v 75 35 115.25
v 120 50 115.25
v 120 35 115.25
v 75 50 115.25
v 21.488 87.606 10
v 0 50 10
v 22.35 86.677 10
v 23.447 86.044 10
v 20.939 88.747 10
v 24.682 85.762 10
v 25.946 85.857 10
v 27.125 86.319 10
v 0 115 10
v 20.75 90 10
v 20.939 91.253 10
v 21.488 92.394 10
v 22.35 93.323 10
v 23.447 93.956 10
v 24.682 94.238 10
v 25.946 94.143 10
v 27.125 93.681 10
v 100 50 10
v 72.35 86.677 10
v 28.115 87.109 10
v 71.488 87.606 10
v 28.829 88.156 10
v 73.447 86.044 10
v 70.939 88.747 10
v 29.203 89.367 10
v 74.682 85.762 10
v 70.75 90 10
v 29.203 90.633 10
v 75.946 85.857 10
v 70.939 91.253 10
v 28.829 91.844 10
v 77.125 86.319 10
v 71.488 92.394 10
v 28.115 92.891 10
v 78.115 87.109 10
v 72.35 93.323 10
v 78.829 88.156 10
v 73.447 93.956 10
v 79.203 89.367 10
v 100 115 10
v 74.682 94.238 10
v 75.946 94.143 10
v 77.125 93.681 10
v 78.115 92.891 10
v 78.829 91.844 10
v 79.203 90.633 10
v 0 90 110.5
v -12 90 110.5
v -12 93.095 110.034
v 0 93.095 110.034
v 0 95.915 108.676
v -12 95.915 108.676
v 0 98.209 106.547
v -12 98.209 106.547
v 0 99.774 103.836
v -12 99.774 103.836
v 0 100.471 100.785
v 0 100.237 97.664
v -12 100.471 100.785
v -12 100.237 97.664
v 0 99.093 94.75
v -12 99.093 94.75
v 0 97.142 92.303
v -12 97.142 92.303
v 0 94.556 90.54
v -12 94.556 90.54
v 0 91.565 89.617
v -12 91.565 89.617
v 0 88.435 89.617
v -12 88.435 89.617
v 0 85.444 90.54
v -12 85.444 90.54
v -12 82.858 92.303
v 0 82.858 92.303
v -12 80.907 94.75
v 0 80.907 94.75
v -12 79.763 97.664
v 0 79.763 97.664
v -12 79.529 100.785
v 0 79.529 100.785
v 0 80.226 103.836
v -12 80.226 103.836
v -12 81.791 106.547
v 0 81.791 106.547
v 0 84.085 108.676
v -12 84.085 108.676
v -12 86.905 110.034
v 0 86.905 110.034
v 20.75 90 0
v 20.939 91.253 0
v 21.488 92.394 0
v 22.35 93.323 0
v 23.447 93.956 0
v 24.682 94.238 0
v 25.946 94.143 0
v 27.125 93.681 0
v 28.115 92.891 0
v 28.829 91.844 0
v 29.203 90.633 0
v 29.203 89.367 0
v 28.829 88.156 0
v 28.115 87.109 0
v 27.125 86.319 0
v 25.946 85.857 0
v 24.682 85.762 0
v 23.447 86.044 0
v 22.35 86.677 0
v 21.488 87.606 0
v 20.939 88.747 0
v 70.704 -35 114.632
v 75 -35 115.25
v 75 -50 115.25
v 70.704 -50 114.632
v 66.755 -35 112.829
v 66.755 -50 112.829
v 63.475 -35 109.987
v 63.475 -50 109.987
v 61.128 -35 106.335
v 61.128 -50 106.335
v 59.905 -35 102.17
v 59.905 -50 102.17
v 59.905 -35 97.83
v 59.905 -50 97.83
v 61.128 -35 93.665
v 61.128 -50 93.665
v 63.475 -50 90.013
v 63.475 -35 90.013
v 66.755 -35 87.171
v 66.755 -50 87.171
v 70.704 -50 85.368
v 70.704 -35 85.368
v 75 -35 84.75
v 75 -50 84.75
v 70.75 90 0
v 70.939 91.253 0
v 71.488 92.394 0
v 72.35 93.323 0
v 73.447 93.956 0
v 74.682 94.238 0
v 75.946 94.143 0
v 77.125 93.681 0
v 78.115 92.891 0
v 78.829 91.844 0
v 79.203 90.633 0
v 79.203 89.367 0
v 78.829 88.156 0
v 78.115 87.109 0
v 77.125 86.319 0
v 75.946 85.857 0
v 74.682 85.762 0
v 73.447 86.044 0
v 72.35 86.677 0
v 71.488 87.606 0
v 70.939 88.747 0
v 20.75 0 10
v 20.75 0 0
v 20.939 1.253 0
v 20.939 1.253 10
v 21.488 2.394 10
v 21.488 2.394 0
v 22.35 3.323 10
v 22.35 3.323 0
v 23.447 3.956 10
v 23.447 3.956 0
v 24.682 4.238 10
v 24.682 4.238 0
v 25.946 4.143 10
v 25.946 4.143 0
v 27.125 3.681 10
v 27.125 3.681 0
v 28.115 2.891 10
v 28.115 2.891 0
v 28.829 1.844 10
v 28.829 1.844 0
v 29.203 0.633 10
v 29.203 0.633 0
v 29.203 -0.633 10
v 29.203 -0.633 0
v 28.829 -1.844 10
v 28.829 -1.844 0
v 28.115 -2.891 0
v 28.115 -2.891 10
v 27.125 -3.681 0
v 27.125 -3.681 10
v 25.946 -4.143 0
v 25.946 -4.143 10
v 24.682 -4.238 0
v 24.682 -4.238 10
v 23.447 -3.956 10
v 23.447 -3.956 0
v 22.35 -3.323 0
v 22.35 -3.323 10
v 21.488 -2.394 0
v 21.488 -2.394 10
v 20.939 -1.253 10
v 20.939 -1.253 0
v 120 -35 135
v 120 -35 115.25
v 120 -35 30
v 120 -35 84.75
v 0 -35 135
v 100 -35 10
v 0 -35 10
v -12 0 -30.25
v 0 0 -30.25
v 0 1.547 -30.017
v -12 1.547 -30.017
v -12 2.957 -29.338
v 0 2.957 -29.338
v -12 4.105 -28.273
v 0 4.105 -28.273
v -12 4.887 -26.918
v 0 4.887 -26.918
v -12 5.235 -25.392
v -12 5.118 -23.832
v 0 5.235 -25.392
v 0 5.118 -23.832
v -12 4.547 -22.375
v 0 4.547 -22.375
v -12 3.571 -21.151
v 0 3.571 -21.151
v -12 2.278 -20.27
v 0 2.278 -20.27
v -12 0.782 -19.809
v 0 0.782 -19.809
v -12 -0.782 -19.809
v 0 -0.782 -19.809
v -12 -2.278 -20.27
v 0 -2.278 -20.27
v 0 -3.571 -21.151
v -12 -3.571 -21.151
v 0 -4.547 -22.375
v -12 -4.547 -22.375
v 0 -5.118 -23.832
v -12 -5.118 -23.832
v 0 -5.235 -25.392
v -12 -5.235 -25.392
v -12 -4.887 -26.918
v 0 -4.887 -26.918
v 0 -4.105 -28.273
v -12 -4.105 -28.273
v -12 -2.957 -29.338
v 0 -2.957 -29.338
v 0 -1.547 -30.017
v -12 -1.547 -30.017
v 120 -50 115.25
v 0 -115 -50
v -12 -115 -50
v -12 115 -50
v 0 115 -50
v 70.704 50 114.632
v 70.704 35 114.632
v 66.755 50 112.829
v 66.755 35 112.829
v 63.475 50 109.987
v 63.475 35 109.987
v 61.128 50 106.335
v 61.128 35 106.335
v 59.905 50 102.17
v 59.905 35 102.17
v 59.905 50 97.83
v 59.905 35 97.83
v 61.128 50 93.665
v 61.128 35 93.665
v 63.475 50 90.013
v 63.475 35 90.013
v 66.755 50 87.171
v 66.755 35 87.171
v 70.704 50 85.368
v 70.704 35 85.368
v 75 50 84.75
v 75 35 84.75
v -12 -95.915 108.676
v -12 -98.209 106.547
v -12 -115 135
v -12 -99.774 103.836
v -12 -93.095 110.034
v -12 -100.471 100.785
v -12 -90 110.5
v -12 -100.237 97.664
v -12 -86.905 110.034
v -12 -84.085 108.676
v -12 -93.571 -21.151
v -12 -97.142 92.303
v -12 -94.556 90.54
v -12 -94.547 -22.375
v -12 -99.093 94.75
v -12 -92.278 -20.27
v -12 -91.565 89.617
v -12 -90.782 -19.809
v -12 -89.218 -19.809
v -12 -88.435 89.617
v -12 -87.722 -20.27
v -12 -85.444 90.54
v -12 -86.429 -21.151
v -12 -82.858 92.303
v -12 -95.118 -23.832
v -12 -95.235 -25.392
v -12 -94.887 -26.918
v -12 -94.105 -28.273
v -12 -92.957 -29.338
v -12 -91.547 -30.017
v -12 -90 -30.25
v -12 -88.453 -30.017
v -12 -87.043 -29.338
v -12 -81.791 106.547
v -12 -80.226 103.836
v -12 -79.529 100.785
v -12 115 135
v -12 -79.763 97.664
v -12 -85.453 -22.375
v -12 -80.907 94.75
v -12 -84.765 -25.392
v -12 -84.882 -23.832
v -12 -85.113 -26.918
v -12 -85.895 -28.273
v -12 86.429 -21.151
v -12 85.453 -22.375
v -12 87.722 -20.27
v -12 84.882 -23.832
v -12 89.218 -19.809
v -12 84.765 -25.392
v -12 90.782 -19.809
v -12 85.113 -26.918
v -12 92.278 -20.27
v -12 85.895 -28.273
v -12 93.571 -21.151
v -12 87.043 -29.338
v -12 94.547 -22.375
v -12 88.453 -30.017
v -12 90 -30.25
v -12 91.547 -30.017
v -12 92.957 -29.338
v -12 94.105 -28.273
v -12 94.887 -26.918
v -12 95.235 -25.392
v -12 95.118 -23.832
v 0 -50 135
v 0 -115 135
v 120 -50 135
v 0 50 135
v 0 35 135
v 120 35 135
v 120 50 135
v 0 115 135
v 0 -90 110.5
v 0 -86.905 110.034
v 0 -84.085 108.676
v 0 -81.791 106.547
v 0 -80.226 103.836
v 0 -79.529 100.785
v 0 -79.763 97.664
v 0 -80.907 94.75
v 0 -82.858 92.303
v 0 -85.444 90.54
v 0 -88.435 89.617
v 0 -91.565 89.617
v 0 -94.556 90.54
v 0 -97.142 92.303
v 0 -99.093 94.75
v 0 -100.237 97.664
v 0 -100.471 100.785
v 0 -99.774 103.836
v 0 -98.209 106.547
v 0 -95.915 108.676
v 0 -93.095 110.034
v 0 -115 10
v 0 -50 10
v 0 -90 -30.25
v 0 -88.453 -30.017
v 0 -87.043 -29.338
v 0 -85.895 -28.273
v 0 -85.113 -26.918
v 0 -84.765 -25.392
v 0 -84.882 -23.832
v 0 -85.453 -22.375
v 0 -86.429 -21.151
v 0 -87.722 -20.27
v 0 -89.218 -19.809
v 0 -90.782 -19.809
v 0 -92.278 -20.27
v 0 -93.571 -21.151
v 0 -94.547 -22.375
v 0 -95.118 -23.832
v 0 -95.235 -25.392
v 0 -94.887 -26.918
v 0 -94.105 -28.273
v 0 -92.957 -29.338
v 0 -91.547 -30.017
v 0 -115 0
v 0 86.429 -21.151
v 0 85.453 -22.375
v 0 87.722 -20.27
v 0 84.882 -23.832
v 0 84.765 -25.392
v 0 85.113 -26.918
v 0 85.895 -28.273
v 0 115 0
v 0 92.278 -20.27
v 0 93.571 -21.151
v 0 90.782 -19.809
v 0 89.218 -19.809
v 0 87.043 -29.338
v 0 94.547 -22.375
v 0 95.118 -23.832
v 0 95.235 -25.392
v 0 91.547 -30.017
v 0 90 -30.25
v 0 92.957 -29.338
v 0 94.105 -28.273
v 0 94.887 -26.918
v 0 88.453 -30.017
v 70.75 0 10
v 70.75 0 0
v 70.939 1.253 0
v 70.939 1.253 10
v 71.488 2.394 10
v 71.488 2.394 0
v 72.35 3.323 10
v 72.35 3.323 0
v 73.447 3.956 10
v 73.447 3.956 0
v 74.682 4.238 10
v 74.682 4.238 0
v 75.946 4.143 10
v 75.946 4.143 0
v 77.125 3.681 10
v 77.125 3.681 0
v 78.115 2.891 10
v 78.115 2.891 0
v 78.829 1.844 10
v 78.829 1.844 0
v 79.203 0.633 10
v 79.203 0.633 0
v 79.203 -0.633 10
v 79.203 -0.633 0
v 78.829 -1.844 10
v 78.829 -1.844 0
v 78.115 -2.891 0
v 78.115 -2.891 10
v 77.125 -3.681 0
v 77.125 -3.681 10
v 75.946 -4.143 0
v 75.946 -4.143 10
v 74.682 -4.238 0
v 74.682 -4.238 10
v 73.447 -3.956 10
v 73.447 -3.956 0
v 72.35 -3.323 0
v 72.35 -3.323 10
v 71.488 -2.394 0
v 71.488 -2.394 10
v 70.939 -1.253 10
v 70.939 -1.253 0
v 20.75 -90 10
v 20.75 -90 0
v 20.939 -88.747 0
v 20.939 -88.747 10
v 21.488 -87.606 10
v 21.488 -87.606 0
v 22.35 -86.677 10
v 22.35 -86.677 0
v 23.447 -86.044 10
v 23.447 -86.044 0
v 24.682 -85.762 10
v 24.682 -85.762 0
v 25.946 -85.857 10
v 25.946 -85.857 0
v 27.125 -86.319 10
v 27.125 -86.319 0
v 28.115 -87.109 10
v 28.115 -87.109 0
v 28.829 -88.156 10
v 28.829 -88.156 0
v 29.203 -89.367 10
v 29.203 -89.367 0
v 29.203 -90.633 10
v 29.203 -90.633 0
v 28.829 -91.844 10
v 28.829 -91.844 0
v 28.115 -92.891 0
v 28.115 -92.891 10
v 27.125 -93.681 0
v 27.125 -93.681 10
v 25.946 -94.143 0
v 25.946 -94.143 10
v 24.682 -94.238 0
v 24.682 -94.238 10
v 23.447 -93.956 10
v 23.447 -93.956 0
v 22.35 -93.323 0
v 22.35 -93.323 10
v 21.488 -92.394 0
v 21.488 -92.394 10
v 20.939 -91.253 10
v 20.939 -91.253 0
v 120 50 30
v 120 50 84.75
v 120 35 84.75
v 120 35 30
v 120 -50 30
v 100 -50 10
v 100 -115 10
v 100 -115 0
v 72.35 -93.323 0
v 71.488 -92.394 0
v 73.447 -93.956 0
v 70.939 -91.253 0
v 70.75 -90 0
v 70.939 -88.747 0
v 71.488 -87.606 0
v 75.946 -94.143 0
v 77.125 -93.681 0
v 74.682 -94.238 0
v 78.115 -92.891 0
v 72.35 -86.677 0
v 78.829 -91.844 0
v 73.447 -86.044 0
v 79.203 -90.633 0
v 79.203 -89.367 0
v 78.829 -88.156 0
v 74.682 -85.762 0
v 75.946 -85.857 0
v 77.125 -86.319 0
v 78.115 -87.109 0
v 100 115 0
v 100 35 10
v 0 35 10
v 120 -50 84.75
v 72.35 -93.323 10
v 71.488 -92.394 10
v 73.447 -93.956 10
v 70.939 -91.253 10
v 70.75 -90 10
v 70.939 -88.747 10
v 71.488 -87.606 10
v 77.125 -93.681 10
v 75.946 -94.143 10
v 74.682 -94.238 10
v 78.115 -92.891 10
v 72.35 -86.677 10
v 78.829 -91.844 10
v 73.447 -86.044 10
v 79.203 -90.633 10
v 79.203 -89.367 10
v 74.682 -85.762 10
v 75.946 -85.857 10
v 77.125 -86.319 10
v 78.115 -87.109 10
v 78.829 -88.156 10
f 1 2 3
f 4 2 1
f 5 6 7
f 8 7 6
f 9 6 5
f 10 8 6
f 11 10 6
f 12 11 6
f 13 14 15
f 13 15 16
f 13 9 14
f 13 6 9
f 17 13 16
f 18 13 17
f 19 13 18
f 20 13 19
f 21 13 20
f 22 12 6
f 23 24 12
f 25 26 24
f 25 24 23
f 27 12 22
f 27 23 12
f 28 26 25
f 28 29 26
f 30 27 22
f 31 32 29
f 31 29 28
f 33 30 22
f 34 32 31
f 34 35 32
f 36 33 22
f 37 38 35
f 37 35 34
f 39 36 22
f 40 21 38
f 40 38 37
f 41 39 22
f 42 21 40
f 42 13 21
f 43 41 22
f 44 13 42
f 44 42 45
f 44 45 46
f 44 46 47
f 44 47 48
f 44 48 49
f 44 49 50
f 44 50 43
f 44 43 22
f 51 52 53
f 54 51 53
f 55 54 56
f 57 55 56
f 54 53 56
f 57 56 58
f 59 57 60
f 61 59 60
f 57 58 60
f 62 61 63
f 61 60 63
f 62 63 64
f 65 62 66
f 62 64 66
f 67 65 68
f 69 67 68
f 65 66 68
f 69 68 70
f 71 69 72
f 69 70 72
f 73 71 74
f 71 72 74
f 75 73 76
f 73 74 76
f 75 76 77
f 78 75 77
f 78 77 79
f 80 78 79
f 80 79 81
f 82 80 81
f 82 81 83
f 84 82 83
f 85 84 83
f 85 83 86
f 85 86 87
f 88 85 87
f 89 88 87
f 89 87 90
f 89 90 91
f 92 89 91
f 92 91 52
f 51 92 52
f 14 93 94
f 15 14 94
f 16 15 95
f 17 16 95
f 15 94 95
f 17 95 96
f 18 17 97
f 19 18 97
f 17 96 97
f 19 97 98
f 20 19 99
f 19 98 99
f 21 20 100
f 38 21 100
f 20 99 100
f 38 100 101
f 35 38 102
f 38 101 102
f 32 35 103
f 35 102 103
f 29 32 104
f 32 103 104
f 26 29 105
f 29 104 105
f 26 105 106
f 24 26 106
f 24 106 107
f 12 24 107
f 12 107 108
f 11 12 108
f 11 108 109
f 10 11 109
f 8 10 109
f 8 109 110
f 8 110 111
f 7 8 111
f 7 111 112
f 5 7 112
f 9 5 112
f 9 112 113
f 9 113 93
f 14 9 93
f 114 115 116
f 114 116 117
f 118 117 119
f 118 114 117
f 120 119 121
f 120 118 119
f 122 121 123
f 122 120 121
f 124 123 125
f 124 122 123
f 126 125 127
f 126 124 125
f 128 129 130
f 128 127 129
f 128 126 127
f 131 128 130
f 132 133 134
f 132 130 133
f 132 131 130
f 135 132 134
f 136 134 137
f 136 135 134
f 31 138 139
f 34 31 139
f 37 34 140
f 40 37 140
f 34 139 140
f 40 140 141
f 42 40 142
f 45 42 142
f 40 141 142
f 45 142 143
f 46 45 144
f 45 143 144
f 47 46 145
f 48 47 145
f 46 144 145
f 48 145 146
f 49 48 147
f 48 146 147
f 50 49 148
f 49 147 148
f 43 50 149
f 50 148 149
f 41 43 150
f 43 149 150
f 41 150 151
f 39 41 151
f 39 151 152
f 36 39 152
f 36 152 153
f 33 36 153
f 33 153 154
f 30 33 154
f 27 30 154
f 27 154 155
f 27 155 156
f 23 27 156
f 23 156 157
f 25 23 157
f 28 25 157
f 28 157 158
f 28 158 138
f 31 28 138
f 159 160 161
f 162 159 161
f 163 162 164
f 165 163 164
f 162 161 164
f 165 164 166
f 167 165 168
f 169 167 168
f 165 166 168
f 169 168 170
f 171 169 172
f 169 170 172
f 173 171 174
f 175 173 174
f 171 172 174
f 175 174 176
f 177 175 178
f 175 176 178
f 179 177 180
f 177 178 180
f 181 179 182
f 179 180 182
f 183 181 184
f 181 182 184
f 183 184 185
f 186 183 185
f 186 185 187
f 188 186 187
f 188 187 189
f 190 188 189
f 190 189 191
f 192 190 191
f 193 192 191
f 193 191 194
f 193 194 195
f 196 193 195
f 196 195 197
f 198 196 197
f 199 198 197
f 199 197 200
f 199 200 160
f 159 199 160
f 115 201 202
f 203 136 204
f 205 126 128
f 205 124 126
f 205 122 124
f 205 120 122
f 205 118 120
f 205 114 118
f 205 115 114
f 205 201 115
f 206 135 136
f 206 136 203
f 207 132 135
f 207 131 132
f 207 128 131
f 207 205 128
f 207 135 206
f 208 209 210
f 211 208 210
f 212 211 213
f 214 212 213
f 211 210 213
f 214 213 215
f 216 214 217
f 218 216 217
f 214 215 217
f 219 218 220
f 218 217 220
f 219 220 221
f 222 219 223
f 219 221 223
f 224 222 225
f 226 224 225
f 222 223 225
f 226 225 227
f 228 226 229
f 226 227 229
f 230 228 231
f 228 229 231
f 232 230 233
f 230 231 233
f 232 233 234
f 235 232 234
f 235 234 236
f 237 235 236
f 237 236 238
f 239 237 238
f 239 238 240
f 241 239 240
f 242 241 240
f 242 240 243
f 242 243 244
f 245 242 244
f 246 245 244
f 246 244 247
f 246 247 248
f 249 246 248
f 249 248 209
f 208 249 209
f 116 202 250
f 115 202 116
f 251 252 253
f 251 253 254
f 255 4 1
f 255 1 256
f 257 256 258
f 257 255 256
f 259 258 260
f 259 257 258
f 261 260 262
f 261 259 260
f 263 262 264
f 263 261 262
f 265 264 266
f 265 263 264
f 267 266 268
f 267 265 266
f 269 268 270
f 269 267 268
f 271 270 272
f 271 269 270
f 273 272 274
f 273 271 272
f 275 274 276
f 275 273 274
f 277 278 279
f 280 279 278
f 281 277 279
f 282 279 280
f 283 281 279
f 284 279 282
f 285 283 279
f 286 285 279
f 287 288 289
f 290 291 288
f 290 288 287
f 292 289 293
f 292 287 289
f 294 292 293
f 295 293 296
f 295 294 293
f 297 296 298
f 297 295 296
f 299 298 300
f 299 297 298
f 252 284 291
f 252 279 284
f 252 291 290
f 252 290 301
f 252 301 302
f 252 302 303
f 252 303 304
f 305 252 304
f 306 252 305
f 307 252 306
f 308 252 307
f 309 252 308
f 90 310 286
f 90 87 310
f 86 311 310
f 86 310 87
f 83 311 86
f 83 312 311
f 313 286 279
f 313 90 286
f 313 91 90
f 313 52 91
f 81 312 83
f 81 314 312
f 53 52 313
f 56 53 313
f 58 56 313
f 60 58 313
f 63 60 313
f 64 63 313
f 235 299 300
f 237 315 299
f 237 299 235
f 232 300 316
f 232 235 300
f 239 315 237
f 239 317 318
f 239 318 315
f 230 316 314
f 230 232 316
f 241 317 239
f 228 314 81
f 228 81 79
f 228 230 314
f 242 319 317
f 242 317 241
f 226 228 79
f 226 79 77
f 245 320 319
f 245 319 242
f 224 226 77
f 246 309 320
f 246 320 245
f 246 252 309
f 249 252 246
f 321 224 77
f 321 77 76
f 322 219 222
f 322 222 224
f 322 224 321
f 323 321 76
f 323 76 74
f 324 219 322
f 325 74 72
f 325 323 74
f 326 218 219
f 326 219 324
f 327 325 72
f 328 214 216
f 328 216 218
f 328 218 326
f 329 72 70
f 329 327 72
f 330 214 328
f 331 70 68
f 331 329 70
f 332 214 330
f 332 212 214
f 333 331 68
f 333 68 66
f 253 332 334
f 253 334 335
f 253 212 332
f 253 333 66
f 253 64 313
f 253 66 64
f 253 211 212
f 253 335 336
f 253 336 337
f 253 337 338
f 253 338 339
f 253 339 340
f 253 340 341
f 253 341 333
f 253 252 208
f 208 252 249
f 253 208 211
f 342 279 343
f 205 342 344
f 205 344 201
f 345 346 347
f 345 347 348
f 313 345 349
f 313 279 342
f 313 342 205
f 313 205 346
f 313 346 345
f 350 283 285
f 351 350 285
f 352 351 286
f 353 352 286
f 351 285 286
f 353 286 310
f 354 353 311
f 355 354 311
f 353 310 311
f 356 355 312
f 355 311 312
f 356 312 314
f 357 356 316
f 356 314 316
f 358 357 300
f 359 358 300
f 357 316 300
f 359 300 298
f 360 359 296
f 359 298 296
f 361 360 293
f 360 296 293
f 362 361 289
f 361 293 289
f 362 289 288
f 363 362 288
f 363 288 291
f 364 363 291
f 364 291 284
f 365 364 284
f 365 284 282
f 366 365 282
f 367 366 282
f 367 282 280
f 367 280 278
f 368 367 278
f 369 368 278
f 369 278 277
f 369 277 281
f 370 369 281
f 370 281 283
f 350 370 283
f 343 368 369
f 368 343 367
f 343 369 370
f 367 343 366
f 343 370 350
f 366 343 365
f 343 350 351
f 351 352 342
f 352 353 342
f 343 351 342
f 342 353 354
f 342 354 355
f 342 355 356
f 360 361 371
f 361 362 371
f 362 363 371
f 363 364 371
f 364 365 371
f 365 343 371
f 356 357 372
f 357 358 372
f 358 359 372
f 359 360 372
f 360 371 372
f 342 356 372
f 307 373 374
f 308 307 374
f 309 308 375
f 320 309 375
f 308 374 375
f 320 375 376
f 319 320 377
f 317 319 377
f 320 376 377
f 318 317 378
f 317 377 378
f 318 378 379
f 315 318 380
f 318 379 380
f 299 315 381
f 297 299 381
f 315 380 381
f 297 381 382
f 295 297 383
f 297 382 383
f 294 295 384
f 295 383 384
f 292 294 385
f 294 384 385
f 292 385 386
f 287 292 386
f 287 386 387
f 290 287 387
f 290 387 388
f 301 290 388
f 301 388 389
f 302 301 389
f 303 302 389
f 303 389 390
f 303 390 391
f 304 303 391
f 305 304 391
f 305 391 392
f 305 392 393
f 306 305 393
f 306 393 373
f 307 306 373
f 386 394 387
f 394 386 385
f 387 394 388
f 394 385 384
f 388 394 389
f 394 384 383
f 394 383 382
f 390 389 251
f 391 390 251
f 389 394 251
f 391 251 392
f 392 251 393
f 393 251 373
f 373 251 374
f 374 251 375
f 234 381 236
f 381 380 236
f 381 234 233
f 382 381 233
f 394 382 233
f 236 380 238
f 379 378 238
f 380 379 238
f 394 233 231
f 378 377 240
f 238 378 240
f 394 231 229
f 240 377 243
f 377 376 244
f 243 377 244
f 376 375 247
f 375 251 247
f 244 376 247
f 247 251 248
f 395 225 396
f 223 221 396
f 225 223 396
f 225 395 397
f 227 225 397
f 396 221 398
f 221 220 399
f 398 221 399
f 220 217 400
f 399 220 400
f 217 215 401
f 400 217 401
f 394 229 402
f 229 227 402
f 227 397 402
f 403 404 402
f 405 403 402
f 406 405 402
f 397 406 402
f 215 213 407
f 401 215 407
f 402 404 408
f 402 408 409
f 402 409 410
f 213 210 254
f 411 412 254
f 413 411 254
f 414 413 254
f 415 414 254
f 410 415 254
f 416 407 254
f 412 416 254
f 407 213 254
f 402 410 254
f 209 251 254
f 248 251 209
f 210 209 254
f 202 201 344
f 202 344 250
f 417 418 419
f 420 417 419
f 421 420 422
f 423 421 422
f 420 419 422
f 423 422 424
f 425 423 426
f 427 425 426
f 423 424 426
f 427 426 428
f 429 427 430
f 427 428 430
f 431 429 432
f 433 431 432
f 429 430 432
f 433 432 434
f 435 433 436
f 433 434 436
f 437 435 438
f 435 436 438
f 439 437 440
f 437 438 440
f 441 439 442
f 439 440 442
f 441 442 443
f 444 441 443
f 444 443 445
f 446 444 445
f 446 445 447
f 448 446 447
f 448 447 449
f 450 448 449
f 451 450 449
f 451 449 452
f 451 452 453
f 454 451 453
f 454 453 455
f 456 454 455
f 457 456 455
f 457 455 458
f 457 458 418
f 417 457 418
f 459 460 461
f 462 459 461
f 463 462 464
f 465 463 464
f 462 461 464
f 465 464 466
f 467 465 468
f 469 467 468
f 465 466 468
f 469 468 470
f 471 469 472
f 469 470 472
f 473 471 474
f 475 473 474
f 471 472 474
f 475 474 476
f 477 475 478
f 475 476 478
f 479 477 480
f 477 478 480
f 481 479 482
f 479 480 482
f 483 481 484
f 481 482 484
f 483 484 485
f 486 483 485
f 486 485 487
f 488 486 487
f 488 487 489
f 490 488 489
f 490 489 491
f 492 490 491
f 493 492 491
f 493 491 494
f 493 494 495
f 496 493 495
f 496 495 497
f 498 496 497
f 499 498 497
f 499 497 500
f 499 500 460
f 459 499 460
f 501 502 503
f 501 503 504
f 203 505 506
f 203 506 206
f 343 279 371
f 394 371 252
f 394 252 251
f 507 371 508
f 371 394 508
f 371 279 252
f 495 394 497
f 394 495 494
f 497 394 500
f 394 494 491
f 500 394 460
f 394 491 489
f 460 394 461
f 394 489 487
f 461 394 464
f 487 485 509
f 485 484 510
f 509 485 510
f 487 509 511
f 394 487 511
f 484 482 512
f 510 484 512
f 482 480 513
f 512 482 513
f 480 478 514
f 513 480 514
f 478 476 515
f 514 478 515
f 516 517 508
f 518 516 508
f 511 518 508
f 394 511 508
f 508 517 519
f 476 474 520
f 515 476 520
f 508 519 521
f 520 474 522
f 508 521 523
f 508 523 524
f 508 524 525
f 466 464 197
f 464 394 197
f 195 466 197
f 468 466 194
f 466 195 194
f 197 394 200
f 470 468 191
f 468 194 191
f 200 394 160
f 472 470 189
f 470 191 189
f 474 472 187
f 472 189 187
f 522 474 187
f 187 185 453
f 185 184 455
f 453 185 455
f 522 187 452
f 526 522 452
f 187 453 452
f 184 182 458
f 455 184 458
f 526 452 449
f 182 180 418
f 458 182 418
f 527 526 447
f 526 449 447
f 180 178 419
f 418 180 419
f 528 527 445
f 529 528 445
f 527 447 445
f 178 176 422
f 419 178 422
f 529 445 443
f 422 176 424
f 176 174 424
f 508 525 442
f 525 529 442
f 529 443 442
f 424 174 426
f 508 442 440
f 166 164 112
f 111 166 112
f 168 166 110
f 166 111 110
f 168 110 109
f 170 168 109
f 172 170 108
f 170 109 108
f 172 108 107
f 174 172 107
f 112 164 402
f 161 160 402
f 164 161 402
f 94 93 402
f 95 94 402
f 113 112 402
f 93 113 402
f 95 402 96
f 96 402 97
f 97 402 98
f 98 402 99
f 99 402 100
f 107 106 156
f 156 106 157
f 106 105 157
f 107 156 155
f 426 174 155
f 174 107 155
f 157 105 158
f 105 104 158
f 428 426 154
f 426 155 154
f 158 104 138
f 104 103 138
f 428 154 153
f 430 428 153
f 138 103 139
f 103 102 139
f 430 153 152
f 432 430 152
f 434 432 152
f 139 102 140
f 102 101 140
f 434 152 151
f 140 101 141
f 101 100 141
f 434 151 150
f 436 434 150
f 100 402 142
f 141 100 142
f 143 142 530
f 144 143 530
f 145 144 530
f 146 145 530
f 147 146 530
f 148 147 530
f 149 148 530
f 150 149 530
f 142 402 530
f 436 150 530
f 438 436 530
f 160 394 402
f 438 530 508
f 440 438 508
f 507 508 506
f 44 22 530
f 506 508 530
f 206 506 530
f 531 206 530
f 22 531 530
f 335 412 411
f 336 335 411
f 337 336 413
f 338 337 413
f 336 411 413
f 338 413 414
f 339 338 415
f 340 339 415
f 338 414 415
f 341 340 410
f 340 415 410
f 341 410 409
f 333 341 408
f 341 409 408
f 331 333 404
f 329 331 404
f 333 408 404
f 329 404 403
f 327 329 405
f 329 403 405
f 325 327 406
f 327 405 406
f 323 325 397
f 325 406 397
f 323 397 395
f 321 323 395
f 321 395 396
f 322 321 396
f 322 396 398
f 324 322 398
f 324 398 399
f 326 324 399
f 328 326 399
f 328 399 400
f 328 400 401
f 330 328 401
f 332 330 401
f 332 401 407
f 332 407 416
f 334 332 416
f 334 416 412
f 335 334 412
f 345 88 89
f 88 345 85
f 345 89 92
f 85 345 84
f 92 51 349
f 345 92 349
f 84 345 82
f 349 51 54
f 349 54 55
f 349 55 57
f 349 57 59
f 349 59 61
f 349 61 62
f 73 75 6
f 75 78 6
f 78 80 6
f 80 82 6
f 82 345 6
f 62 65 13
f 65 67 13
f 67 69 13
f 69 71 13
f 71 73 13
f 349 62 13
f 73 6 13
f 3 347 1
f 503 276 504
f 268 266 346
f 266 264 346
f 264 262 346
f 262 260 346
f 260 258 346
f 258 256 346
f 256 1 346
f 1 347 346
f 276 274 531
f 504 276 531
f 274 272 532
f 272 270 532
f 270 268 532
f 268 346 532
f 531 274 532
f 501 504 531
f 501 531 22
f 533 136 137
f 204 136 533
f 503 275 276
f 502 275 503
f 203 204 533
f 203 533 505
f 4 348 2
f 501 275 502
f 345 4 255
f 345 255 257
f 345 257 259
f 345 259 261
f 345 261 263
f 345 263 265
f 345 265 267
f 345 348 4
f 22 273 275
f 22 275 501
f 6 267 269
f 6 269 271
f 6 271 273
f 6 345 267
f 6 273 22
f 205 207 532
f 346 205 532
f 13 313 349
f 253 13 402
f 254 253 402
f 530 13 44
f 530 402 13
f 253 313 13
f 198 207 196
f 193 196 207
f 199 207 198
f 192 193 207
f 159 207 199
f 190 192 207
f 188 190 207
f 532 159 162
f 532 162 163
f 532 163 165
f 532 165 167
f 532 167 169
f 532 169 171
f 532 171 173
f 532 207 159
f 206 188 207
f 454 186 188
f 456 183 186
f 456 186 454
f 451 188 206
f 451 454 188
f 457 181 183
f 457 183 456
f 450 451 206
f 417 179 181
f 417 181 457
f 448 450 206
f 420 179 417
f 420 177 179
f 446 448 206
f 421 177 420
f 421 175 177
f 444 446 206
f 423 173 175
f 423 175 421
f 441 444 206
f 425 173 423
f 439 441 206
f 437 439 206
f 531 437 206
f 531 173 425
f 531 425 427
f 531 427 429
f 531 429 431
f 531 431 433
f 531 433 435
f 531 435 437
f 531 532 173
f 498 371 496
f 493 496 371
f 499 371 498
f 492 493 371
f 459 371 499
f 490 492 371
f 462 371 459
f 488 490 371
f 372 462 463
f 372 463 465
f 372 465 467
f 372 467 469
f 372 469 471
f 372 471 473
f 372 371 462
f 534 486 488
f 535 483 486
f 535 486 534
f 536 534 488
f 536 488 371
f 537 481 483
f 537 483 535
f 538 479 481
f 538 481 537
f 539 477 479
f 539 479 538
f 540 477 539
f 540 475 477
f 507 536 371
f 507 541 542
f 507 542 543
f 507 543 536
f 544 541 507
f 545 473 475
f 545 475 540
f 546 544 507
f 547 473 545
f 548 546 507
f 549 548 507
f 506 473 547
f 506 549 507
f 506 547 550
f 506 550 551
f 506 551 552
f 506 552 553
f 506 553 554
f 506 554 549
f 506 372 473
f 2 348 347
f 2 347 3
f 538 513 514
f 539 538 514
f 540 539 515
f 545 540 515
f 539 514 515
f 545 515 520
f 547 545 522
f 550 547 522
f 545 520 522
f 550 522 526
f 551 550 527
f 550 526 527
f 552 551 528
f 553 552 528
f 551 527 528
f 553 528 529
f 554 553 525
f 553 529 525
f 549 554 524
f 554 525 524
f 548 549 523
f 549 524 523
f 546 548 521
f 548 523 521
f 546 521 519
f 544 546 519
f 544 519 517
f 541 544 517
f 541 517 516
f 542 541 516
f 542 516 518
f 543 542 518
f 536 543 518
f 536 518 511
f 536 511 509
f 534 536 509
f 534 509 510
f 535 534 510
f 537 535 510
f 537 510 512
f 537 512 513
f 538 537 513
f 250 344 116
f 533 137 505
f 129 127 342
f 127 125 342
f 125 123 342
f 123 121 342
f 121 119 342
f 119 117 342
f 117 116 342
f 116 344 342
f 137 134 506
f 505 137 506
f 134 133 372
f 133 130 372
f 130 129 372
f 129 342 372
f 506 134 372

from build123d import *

# Parameters (mm, degrees)
SKETCH_1_W              = 100
SKETCH_1_H              = 230
EXTRUDE_1_DEPTH         = 10
EXTRUDE_2_DEPTH         = 135
EXTRUDE_2_DEPTH_BACK    = 50
SKETCH_1_3_W            = 12
SKETCH_1_3_H            = 230
SKETCH_2_W              = 125
SKETCH_2_H              = 15
EXTRUDE_3_DEPTH         = 120
CUT_EXTRUDE_1_DEPTH     = 245.642596455
CHAMFER_2_SIZE          = 20
HOLE_WIZARD_3_D         = 21
HOLE_WIZARD_3_DEPTH     = 100
HOLE_WIZARD_M10_1_D     = 8.5
HOLE_WIZARD_M10_1_DEPTH = 24.5
HOLE_WIZARD_M10_1_TIP   = 2.553657631
HOLE_WIZARD_2_D         = 10.5
HOLE_WIZARD_2_DEPTH     = 100


with BuildPart() as part:
    # 草图1 → 凸台-拉伸1 (new body)
    with BuildSketch(Plane.XY):
        with Locations((50, 0)):
            Rectangle(SKETCH_1_W, SKETCH_1_H)
    extrude(amount=EXTRUDE_1_DEPTH)

    # 草图1<3> → 凸台-拉伸2 (add, two sides: drawn at the far end of the back side and taken through both)
    with BuildSketch(Plane.XY.offset(-EXTRUDE_2_DEPTH_BACK)):
        with Locations((-6, 0)):
            Rectangle(SKETCH_1_3_W, SKETCH_1_3_H)
    extrude(amount=EXTRUDE_2_DEPTH + EXTRUDE_2_DEPTH_BACK)

    # 草图2 → 凸台-拉伸3 (add)
    with BuildSketch(Plane(origin=(0, 0, 0), x_dir=(0, 0, -1), z_dir=(1, 0, 0))):
        with Locations((-72.5, -42.5)):
            Rectangle(SKETCH_2_W, SKETCH_2_H)
        with Locations((-72.5, 42.5)):
            Rectangle(SKETCH_2_W, SKETCH_2_H)
    extrude(amount=EXTRUDE_3_DEPTH)

    # 草图3 → 切除-拉伸1 (cut, through all)
    with BuildSketch(Plane(origin=(0, 50, 0), x_dir=(1, 0, 0), z_dir=(0, 1, 0))):
        with BuildLine():
            Line((120, -115.25), (75, -115.25))
            ThreePointArc((75, -115.25), (59.75, -100), (75, -84.75))
            Line((75, -84.75), (120, -84.75))
            ThreePointArc((120, -84.75), (135.25, -100), (120, -115.25))
        make_face()
    extrude(amount=-CUT_EXTRUDE_1_DEPTH, mode=Mode.SUBTRACT)

    # 倒角2
    chamfer_2_edges = [part.edges().sort_by_distance(p)[0] for p in [
        (120, 42.5, 10),
        (120, -42.5, 10),
    ]]
    chamfer(chamfer_2_edges, length=CHAMFER_2_SIZE - 0.0001)  # a hair under: the kernel refuses the full size

    # 孔3
    with Locations(Plane(origin=(0, 0, 0), x_dir=(0, 0, -1), z_dir=(1, 0, 0))):
        with Locations((-100, -90), (-100, 90)):
            Hole(HOLE_WIZARD_3_D / 2, depth=HOLE_WIZARD_3_DEPTH)

    # M10 螺纹孔1
    with Locations(Plane.XY.offset(10)):
        with Locations((25, -90), (75, -90), (75, 90), (25, 90), (75, 0), (25, 0)):
            Hole(HOLE_WIZARD_M10_1_D / 2, depth=HOLE_WIZARD_M10_1_DEPTH)
            with Locations((0, 0, -(HOLE_WIZARD_M10_1_DEPTH + HOLE_WIZARD_M10_1_TIP / 2))):  # 118° drill point
                Cone(0, HOLE_WIZARD_M10_1_D / 2, HOLE_WIZARD_M10_1_TIP, mode=Mode.SUBTRACT)

    # 孔2
    with Locations(Plane.ZY.offset(12)):
        with Locations((-25, 90), (-25, -90), (-25, 0)):
            Hole(HOLE_WIZARD_2_D / 2, depth=HOLE_WIZARD_2_DEPTH)


solid = part.part
